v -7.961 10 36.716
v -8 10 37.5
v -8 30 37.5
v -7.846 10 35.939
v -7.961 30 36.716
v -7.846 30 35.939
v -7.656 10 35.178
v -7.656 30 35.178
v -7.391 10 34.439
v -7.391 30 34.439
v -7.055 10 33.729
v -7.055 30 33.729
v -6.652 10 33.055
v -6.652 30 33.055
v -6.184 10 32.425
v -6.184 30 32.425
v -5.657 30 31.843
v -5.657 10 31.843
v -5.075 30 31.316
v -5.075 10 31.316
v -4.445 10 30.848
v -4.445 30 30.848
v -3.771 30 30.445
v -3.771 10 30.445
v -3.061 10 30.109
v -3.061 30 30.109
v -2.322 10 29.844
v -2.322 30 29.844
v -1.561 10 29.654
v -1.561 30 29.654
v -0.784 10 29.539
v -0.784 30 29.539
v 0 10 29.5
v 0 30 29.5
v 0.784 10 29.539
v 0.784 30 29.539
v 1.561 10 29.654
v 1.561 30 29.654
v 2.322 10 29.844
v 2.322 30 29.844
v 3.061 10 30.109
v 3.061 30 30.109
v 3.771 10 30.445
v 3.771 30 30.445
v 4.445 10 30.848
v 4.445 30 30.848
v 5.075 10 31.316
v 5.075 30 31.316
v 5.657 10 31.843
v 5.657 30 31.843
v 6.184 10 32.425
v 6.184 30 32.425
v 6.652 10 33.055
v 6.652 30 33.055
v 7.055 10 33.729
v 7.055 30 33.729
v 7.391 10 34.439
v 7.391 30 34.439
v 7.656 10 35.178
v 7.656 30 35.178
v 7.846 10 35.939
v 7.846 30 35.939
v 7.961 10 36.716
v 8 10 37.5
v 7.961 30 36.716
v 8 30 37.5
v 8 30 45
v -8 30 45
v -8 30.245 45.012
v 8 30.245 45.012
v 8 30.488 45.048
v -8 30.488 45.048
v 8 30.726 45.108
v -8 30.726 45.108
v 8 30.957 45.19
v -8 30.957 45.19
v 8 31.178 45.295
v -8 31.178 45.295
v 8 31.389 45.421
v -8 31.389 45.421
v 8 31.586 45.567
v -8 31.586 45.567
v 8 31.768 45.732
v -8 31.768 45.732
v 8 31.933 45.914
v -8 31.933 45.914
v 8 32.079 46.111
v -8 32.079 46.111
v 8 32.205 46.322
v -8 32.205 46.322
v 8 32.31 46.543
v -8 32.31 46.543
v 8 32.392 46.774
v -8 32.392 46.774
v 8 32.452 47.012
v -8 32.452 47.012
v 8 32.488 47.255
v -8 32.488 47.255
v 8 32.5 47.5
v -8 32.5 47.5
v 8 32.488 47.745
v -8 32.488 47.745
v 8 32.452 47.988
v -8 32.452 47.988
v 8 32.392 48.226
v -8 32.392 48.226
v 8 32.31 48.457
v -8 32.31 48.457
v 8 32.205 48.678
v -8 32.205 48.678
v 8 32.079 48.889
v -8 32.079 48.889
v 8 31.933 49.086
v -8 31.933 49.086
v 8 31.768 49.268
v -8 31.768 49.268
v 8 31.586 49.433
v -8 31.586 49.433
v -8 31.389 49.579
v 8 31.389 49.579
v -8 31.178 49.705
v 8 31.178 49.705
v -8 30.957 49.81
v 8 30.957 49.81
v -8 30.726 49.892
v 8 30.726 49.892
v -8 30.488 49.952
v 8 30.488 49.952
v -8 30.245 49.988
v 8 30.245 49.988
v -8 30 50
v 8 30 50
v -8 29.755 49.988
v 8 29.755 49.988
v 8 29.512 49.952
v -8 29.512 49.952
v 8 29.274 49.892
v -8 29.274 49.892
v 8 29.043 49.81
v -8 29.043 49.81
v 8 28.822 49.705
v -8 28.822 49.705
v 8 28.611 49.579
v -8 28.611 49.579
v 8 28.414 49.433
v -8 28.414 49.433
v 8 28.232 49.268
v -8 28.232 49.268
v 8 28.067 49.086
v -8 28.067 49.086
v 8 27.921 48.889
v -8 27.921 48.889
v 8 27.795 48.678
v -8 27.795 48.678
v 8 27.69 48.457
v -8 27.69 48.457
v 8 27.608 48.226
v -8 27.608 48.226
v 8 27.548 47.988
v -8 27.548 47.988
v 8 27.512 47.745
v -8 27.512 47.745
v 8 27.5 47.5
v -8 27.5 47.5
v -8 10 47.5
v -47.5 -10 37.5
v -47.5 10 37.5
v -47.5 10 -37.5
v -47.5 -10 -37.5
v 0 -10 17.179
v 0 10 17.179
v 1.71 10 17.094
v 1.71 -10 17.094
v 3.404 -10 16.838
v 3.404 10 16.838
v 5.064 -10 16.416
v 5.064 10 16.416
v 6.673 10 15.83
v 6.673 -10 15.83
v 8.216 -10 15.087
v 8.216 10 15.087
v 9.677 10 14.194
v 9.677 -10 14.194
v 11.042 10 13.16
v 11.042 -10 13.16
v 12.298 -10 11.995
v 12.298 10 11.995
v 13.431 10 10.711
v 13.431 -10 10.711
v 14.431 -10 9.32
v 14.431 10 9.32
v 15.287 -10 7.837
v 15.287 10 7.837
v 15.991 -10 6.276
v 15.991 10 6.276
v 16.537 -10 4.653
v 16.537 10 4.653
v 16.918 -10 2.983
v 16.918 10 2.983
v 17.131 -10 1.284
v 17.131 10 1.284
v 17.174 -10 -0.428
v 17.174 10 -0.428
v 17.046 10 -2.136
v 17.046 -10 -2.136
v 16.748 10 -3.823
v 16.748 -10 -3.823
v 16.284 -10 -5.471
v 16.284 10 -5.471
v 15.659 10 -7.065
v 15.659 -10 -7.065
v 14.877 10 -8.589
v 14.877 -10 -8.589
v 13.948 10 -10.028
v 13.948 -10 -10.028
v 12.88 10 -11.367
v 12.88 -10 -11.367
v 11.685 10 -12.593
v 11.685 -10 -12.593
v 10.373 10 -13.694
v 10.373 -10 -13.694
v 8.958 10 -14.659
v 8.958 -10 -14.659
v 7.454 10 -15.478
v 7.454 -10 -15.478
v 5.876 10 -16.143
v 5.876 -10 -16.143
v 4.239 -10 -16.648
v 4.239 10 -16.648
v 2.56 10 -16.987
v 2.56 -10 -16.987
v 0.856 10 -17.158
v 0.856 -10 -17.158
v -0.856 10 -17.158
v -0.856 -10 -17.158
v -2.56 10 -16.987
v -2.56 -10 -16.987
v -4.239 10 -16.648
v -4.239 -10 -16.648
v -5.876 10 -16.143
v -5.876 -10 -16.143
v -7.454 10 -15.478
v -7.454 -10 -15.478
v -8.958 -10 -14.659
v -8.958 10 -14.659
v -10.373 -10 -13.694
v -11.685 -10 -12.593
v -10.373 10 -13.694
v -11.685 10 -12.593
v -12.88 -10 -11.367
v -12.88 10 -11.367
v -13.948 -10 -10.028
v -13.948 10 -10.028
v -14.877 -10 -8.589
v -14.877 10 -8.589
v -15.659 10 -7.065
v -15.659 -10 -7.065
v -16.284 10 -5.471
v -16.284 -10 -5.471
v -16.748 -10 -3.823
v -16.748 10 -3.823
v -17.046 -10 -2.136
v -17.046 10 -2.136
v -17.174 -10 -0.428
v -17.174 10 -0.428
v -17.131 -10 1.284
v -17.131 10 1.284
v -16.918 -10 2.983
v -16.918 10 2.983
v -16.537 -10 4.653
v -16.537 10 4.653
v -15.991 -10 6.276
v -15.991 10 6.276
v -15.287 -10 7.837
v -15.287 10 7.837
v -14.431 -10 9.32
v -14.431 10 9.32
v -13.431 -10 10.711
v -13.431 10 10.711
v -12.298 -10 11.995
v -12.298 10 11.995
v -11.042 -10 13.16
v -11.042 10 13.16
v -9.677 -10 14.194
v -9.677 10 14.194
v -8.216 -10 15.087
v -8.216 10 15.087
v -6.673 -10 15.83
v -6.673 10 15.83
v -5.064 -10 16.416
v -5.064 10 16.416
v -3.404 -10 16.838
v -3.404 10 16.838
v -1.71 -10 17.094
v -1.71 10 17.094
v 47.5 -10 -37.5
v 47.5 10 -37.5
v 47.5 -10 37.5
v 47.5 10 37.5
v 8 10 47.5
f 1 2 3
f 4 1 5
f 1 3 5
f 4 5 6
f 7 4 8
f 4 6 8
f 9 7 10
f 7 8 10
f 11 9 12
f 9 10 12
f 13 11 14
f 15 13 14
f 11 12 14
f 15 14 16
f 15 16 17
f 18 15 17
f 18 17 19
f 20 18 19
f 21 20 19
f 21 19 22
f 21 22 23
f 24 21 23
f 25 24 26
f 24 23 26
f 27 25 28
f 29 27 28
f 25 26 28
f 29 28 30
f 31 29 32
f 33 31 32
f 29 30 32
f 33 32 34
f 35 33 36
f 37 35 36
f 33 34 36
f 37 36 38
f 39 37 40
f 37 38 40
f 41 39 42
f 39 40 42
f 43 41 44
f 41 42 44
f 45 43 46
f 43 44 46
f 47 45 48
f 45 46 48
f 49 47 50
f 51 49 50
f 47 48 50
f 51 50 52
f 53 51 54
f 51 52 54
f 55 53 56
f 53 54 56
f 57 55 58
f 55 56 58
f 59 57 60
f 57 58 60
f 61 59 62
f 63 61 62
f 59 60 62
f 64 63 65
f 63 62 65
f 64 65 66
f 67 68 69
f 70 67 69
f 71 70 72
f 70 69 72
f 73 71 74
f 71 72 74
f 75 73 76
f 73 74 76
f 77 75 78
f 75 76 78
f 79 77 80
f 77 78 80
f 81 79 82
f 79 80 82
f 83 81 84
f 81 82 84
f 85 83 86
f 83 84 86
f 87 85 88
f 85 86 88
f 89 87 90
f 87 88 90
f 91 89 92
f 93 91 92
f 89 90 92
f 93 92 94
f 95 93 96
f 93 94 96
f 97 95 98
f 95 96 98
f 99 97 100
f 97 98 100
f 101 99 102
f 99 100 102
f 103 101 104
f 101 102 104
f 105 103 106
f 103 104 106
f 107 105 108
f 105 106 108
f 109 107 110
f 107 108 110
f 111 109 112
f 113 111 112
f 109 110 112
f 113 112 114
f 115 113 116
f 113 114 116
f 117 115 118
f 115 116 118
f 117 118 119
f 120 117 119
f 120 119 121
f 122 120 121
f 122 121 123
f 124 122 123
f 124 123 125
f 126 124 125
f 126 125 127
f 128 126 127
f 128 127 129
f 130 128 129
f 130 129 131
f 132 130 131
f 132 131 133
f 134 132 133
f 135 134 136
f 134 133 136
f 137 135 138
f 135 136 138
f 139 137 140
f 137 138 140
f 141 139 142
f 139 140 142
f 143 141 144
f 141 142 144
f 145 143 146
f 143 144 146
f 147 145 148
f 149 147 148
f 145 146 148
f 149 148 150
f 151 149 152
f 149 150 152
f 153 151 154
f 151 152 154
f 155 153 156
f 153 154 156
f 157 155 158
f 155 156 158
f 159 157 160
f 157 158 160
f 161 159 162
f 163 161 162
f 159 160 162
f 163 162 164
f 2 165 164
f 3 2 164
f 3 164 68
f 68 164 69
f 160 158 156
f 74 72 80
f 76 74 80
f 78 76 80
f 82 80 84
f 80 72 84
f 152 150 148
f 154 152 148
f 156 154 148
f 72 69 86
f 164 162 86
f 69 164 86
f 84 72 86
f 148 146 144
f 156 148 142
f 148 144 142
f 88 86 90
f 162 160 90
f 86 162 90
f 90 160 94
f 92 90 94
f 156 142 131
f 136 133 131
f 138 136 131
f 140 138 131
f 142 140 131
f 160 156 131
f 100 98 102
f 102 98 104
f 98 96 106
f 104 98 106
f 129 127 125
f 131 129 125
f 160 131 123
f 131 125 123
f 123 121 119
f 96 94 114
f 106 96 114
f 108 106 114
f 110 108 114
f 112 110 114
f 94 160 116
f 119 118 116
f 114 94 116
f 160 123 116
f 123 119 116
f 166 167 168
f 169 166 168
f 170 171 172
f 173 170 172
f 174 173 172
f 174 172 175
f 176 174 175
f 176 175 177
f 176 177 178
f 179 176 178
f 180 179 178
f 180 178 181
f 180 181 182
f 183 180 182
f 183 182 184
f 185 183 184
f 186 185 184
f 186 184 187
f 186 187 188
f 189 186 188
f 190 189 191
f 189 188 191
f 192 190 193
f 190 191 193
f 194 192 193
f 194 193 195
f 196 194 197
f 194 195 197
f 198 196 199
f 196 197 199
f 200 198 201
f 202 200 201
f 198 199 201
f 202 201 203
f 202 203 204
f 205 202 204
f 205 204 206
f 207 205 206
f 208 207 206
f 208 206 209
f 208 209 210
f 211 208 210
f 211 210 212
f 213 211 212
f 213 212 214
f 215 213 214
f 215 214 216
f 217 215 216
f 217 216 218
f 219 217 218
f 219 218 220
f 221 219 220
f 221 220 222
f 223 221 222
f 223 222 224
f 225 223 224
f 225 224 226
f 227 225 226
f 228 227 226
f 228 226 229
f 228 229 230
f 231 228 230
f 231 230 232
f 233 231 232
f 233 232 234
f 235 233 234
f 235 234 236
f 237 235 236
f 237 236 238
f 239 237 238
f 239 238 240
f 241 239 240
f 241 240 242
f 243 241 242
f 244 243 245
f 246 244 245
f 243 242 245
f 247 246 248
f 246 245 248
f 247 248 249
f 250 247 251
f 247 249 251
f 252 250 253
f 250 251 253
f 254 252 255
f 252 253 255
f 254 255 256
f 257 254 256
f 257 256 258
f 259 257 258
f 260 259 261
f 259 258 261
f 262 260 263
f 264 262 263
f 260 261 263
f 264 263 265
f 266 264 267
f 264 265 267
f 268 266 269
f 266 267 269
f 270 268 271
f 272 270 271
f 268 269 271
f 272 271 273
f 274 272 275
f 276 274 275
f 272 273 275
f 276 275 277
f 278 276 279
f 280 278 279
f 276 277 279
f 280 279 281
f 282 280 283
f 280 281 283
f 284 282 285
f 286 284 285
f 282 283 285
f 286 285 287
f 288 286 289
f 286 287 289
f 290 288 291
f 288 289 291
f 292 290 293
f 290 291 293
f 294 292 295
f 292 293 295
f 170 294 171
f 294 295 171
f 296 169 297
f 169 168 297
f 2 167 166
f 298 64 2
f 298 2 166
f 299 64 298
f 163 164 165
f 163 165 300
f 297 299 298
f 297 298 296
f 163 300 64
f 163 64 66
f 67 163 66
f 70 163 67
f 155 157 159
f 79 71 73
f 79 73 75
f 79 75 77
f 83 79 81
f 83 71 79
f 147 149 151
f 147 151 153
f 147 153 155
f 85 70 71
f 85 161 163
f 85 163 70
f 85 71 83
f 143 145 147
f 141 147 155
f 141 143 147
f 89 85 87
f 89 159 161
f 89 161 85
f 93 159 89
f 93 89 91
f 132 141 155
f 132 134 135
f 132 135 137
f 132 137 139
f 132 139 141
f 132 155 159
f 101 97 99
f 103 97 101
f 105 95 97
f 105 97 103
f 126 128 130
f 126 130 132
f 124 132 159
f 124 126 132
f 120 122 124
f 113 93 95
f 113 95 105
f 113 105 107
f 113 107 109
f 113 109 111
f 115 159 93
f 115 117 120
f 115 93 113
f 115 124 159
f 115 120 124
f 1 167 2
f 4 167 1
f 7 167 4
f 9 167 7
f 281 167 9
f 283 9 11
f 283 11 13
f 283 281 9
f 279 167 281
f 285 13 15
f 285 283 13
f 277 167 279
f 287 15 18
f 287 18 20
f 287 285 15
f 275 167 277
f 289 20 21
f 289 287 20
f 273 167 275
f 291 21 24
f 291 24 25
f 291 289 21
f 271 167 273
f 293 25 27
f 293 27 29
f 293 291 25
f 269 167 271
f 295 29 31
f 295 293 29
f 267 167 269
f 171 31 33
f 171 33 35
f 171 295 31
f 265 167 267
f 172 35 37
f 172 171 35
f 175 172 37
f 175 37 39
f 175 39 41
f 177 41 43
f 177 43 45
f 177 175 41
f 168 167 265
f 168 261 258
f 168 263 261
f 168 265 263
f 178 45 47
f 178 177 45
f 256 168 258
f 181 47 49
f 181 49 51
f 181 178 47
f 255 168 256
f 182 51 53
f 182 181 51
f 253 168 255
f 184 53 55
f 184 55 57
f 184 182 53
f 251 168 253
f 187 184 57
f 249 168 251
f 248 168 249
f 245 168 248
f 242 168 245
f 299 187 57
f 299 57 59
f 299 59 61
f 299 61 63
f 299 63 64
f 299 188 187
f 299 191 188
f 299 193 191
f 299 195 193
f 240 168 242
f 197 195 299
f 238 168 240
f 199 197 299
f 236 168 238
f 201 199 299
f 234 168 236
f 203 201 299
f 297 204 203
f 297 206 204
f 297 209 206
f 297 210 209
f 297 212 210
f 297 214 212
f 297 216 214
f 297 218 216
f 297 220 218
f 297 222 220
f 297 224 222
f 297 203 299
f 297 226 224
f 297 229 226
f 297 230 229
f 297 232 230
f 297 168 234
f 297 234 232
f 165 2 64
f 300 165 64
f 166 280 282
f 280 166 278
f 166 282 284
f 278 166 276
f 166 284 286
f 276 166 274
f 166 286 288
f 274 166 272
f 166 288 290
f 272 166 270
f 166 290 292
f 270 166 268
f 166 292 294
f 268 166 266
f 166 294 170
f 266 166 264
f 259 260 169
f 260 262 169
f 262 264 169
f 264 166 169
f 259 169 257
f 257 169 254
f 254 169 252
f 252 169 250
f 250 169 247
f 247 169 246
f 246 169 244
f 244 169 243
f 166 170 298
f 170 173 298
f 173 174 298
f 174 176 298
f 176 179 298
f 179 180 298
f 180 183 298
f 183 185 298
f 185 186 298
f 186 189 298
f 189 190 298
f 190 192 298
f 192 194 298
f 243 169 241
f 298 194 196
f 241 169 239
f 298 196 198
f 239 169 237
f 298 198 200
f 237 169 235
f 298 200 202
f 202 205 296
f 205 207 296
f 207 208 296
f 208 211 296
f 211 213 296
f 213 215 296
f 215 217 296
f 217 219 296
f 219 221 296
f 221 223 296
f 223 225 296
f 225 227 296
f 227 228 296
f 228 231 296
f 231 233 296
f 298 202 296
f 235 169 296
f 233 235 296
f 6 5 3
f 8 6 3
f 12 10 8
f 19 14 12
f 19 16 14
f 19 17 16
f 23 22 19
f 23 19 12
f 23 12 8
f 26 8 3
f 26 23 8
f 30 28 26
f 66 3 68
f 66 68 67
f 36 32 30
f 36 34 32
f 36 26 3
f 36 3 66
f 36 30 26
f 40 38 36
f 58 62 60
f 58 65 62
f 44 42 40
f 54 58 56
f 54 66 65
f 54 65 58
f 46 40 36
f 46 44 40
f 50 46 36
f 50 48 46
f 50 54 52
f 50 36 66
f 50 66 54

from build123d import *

# Parameters (mm, degrees)
SKETCH1_W           = 95
SKETCH1_H           = 75
BOSS_EXTRUDE1_DEPTH = 10
SKETCH2_W           = 8
SKETCH2_H           = 20
REVOLVE1_ANGLE      = 180
SKETCH3_W           = 16
SKETCH3_H           = 20
BOSS_EXTRUDE2_DEPTH = 10
SKETCH4_R           = 17.178882312
CUT_EXTRUDE1_DEPTH  = 71.089228844
SWEEP2_START        = -8
SWEEP2_DEPTH        = 16


# Read off the part's stored shape, not the designer's step: Sweep2
with BuildPart() as part:
    # Sketch1 → Boss-Extrude1 (new, symmetric)
    with BuildSketch(Plane(origin=(0, 0, 0), x_dir=(1, 0, 0), z_dir=(0, 1, 0))):
        Rectangle(SKETCH1_W, SKETCH1_H)
    extrude(amount=BOSS_EXTRUDE1_DEPTH, both=True)

    # Sketch2 → Revolve1 (revolve)
    with BuildSketch(Plane.XY.offset(37.5)):
        with Locations((-4, 20)):
            Rectangle(SKETCH2_W, SKETCH2_H)
    revolve(axis=Axis((0, 10, 37.5), (0, -1, 0)), revolution_arc=REVOLVE1_ANGLE)

    # Sketch3 → Boss-Extrude2 (add)
    with BuildSketch(Plane.XY.offset(37.5)):
        with Locations((0, 20)):
            Rectangle(SKETCH3_W, SKETCH3_H)
    extrude(amount=BOSS_EXTRUDE2_DEPTH)

    # Sketch4 → Cut-Extrude1 (cut, through all)
    with BuildSketch(Plane(origin=(0, 10, 0), x_dir=(1, 0, 0), z_dir=(0, 1, 0))):
        with Locations(Location((0, 0, 0), (0, 0, 270))):
            Circle(SKETCH4_R)
    extrude(amount=-CUT_EXTRUDE1_DEPTH, mode=Mode.SUBTRACT)

    # Sweep2 outline → Sweep2 (add)
    with BuildSketch(Plane.YZ.offset(SWEEP2_START)):
        with BuildLine():
            ThreePointArc((30, 45), (31.767766953, 49.267766953), (27.5, 47.5))
            Line((27.5, 47.5), (30, 47.5))
            Line((30, 47.5), (30, 45))
        make_face()
    extrude(amount=SWEEP2_DEPTH)


solid = part.part
